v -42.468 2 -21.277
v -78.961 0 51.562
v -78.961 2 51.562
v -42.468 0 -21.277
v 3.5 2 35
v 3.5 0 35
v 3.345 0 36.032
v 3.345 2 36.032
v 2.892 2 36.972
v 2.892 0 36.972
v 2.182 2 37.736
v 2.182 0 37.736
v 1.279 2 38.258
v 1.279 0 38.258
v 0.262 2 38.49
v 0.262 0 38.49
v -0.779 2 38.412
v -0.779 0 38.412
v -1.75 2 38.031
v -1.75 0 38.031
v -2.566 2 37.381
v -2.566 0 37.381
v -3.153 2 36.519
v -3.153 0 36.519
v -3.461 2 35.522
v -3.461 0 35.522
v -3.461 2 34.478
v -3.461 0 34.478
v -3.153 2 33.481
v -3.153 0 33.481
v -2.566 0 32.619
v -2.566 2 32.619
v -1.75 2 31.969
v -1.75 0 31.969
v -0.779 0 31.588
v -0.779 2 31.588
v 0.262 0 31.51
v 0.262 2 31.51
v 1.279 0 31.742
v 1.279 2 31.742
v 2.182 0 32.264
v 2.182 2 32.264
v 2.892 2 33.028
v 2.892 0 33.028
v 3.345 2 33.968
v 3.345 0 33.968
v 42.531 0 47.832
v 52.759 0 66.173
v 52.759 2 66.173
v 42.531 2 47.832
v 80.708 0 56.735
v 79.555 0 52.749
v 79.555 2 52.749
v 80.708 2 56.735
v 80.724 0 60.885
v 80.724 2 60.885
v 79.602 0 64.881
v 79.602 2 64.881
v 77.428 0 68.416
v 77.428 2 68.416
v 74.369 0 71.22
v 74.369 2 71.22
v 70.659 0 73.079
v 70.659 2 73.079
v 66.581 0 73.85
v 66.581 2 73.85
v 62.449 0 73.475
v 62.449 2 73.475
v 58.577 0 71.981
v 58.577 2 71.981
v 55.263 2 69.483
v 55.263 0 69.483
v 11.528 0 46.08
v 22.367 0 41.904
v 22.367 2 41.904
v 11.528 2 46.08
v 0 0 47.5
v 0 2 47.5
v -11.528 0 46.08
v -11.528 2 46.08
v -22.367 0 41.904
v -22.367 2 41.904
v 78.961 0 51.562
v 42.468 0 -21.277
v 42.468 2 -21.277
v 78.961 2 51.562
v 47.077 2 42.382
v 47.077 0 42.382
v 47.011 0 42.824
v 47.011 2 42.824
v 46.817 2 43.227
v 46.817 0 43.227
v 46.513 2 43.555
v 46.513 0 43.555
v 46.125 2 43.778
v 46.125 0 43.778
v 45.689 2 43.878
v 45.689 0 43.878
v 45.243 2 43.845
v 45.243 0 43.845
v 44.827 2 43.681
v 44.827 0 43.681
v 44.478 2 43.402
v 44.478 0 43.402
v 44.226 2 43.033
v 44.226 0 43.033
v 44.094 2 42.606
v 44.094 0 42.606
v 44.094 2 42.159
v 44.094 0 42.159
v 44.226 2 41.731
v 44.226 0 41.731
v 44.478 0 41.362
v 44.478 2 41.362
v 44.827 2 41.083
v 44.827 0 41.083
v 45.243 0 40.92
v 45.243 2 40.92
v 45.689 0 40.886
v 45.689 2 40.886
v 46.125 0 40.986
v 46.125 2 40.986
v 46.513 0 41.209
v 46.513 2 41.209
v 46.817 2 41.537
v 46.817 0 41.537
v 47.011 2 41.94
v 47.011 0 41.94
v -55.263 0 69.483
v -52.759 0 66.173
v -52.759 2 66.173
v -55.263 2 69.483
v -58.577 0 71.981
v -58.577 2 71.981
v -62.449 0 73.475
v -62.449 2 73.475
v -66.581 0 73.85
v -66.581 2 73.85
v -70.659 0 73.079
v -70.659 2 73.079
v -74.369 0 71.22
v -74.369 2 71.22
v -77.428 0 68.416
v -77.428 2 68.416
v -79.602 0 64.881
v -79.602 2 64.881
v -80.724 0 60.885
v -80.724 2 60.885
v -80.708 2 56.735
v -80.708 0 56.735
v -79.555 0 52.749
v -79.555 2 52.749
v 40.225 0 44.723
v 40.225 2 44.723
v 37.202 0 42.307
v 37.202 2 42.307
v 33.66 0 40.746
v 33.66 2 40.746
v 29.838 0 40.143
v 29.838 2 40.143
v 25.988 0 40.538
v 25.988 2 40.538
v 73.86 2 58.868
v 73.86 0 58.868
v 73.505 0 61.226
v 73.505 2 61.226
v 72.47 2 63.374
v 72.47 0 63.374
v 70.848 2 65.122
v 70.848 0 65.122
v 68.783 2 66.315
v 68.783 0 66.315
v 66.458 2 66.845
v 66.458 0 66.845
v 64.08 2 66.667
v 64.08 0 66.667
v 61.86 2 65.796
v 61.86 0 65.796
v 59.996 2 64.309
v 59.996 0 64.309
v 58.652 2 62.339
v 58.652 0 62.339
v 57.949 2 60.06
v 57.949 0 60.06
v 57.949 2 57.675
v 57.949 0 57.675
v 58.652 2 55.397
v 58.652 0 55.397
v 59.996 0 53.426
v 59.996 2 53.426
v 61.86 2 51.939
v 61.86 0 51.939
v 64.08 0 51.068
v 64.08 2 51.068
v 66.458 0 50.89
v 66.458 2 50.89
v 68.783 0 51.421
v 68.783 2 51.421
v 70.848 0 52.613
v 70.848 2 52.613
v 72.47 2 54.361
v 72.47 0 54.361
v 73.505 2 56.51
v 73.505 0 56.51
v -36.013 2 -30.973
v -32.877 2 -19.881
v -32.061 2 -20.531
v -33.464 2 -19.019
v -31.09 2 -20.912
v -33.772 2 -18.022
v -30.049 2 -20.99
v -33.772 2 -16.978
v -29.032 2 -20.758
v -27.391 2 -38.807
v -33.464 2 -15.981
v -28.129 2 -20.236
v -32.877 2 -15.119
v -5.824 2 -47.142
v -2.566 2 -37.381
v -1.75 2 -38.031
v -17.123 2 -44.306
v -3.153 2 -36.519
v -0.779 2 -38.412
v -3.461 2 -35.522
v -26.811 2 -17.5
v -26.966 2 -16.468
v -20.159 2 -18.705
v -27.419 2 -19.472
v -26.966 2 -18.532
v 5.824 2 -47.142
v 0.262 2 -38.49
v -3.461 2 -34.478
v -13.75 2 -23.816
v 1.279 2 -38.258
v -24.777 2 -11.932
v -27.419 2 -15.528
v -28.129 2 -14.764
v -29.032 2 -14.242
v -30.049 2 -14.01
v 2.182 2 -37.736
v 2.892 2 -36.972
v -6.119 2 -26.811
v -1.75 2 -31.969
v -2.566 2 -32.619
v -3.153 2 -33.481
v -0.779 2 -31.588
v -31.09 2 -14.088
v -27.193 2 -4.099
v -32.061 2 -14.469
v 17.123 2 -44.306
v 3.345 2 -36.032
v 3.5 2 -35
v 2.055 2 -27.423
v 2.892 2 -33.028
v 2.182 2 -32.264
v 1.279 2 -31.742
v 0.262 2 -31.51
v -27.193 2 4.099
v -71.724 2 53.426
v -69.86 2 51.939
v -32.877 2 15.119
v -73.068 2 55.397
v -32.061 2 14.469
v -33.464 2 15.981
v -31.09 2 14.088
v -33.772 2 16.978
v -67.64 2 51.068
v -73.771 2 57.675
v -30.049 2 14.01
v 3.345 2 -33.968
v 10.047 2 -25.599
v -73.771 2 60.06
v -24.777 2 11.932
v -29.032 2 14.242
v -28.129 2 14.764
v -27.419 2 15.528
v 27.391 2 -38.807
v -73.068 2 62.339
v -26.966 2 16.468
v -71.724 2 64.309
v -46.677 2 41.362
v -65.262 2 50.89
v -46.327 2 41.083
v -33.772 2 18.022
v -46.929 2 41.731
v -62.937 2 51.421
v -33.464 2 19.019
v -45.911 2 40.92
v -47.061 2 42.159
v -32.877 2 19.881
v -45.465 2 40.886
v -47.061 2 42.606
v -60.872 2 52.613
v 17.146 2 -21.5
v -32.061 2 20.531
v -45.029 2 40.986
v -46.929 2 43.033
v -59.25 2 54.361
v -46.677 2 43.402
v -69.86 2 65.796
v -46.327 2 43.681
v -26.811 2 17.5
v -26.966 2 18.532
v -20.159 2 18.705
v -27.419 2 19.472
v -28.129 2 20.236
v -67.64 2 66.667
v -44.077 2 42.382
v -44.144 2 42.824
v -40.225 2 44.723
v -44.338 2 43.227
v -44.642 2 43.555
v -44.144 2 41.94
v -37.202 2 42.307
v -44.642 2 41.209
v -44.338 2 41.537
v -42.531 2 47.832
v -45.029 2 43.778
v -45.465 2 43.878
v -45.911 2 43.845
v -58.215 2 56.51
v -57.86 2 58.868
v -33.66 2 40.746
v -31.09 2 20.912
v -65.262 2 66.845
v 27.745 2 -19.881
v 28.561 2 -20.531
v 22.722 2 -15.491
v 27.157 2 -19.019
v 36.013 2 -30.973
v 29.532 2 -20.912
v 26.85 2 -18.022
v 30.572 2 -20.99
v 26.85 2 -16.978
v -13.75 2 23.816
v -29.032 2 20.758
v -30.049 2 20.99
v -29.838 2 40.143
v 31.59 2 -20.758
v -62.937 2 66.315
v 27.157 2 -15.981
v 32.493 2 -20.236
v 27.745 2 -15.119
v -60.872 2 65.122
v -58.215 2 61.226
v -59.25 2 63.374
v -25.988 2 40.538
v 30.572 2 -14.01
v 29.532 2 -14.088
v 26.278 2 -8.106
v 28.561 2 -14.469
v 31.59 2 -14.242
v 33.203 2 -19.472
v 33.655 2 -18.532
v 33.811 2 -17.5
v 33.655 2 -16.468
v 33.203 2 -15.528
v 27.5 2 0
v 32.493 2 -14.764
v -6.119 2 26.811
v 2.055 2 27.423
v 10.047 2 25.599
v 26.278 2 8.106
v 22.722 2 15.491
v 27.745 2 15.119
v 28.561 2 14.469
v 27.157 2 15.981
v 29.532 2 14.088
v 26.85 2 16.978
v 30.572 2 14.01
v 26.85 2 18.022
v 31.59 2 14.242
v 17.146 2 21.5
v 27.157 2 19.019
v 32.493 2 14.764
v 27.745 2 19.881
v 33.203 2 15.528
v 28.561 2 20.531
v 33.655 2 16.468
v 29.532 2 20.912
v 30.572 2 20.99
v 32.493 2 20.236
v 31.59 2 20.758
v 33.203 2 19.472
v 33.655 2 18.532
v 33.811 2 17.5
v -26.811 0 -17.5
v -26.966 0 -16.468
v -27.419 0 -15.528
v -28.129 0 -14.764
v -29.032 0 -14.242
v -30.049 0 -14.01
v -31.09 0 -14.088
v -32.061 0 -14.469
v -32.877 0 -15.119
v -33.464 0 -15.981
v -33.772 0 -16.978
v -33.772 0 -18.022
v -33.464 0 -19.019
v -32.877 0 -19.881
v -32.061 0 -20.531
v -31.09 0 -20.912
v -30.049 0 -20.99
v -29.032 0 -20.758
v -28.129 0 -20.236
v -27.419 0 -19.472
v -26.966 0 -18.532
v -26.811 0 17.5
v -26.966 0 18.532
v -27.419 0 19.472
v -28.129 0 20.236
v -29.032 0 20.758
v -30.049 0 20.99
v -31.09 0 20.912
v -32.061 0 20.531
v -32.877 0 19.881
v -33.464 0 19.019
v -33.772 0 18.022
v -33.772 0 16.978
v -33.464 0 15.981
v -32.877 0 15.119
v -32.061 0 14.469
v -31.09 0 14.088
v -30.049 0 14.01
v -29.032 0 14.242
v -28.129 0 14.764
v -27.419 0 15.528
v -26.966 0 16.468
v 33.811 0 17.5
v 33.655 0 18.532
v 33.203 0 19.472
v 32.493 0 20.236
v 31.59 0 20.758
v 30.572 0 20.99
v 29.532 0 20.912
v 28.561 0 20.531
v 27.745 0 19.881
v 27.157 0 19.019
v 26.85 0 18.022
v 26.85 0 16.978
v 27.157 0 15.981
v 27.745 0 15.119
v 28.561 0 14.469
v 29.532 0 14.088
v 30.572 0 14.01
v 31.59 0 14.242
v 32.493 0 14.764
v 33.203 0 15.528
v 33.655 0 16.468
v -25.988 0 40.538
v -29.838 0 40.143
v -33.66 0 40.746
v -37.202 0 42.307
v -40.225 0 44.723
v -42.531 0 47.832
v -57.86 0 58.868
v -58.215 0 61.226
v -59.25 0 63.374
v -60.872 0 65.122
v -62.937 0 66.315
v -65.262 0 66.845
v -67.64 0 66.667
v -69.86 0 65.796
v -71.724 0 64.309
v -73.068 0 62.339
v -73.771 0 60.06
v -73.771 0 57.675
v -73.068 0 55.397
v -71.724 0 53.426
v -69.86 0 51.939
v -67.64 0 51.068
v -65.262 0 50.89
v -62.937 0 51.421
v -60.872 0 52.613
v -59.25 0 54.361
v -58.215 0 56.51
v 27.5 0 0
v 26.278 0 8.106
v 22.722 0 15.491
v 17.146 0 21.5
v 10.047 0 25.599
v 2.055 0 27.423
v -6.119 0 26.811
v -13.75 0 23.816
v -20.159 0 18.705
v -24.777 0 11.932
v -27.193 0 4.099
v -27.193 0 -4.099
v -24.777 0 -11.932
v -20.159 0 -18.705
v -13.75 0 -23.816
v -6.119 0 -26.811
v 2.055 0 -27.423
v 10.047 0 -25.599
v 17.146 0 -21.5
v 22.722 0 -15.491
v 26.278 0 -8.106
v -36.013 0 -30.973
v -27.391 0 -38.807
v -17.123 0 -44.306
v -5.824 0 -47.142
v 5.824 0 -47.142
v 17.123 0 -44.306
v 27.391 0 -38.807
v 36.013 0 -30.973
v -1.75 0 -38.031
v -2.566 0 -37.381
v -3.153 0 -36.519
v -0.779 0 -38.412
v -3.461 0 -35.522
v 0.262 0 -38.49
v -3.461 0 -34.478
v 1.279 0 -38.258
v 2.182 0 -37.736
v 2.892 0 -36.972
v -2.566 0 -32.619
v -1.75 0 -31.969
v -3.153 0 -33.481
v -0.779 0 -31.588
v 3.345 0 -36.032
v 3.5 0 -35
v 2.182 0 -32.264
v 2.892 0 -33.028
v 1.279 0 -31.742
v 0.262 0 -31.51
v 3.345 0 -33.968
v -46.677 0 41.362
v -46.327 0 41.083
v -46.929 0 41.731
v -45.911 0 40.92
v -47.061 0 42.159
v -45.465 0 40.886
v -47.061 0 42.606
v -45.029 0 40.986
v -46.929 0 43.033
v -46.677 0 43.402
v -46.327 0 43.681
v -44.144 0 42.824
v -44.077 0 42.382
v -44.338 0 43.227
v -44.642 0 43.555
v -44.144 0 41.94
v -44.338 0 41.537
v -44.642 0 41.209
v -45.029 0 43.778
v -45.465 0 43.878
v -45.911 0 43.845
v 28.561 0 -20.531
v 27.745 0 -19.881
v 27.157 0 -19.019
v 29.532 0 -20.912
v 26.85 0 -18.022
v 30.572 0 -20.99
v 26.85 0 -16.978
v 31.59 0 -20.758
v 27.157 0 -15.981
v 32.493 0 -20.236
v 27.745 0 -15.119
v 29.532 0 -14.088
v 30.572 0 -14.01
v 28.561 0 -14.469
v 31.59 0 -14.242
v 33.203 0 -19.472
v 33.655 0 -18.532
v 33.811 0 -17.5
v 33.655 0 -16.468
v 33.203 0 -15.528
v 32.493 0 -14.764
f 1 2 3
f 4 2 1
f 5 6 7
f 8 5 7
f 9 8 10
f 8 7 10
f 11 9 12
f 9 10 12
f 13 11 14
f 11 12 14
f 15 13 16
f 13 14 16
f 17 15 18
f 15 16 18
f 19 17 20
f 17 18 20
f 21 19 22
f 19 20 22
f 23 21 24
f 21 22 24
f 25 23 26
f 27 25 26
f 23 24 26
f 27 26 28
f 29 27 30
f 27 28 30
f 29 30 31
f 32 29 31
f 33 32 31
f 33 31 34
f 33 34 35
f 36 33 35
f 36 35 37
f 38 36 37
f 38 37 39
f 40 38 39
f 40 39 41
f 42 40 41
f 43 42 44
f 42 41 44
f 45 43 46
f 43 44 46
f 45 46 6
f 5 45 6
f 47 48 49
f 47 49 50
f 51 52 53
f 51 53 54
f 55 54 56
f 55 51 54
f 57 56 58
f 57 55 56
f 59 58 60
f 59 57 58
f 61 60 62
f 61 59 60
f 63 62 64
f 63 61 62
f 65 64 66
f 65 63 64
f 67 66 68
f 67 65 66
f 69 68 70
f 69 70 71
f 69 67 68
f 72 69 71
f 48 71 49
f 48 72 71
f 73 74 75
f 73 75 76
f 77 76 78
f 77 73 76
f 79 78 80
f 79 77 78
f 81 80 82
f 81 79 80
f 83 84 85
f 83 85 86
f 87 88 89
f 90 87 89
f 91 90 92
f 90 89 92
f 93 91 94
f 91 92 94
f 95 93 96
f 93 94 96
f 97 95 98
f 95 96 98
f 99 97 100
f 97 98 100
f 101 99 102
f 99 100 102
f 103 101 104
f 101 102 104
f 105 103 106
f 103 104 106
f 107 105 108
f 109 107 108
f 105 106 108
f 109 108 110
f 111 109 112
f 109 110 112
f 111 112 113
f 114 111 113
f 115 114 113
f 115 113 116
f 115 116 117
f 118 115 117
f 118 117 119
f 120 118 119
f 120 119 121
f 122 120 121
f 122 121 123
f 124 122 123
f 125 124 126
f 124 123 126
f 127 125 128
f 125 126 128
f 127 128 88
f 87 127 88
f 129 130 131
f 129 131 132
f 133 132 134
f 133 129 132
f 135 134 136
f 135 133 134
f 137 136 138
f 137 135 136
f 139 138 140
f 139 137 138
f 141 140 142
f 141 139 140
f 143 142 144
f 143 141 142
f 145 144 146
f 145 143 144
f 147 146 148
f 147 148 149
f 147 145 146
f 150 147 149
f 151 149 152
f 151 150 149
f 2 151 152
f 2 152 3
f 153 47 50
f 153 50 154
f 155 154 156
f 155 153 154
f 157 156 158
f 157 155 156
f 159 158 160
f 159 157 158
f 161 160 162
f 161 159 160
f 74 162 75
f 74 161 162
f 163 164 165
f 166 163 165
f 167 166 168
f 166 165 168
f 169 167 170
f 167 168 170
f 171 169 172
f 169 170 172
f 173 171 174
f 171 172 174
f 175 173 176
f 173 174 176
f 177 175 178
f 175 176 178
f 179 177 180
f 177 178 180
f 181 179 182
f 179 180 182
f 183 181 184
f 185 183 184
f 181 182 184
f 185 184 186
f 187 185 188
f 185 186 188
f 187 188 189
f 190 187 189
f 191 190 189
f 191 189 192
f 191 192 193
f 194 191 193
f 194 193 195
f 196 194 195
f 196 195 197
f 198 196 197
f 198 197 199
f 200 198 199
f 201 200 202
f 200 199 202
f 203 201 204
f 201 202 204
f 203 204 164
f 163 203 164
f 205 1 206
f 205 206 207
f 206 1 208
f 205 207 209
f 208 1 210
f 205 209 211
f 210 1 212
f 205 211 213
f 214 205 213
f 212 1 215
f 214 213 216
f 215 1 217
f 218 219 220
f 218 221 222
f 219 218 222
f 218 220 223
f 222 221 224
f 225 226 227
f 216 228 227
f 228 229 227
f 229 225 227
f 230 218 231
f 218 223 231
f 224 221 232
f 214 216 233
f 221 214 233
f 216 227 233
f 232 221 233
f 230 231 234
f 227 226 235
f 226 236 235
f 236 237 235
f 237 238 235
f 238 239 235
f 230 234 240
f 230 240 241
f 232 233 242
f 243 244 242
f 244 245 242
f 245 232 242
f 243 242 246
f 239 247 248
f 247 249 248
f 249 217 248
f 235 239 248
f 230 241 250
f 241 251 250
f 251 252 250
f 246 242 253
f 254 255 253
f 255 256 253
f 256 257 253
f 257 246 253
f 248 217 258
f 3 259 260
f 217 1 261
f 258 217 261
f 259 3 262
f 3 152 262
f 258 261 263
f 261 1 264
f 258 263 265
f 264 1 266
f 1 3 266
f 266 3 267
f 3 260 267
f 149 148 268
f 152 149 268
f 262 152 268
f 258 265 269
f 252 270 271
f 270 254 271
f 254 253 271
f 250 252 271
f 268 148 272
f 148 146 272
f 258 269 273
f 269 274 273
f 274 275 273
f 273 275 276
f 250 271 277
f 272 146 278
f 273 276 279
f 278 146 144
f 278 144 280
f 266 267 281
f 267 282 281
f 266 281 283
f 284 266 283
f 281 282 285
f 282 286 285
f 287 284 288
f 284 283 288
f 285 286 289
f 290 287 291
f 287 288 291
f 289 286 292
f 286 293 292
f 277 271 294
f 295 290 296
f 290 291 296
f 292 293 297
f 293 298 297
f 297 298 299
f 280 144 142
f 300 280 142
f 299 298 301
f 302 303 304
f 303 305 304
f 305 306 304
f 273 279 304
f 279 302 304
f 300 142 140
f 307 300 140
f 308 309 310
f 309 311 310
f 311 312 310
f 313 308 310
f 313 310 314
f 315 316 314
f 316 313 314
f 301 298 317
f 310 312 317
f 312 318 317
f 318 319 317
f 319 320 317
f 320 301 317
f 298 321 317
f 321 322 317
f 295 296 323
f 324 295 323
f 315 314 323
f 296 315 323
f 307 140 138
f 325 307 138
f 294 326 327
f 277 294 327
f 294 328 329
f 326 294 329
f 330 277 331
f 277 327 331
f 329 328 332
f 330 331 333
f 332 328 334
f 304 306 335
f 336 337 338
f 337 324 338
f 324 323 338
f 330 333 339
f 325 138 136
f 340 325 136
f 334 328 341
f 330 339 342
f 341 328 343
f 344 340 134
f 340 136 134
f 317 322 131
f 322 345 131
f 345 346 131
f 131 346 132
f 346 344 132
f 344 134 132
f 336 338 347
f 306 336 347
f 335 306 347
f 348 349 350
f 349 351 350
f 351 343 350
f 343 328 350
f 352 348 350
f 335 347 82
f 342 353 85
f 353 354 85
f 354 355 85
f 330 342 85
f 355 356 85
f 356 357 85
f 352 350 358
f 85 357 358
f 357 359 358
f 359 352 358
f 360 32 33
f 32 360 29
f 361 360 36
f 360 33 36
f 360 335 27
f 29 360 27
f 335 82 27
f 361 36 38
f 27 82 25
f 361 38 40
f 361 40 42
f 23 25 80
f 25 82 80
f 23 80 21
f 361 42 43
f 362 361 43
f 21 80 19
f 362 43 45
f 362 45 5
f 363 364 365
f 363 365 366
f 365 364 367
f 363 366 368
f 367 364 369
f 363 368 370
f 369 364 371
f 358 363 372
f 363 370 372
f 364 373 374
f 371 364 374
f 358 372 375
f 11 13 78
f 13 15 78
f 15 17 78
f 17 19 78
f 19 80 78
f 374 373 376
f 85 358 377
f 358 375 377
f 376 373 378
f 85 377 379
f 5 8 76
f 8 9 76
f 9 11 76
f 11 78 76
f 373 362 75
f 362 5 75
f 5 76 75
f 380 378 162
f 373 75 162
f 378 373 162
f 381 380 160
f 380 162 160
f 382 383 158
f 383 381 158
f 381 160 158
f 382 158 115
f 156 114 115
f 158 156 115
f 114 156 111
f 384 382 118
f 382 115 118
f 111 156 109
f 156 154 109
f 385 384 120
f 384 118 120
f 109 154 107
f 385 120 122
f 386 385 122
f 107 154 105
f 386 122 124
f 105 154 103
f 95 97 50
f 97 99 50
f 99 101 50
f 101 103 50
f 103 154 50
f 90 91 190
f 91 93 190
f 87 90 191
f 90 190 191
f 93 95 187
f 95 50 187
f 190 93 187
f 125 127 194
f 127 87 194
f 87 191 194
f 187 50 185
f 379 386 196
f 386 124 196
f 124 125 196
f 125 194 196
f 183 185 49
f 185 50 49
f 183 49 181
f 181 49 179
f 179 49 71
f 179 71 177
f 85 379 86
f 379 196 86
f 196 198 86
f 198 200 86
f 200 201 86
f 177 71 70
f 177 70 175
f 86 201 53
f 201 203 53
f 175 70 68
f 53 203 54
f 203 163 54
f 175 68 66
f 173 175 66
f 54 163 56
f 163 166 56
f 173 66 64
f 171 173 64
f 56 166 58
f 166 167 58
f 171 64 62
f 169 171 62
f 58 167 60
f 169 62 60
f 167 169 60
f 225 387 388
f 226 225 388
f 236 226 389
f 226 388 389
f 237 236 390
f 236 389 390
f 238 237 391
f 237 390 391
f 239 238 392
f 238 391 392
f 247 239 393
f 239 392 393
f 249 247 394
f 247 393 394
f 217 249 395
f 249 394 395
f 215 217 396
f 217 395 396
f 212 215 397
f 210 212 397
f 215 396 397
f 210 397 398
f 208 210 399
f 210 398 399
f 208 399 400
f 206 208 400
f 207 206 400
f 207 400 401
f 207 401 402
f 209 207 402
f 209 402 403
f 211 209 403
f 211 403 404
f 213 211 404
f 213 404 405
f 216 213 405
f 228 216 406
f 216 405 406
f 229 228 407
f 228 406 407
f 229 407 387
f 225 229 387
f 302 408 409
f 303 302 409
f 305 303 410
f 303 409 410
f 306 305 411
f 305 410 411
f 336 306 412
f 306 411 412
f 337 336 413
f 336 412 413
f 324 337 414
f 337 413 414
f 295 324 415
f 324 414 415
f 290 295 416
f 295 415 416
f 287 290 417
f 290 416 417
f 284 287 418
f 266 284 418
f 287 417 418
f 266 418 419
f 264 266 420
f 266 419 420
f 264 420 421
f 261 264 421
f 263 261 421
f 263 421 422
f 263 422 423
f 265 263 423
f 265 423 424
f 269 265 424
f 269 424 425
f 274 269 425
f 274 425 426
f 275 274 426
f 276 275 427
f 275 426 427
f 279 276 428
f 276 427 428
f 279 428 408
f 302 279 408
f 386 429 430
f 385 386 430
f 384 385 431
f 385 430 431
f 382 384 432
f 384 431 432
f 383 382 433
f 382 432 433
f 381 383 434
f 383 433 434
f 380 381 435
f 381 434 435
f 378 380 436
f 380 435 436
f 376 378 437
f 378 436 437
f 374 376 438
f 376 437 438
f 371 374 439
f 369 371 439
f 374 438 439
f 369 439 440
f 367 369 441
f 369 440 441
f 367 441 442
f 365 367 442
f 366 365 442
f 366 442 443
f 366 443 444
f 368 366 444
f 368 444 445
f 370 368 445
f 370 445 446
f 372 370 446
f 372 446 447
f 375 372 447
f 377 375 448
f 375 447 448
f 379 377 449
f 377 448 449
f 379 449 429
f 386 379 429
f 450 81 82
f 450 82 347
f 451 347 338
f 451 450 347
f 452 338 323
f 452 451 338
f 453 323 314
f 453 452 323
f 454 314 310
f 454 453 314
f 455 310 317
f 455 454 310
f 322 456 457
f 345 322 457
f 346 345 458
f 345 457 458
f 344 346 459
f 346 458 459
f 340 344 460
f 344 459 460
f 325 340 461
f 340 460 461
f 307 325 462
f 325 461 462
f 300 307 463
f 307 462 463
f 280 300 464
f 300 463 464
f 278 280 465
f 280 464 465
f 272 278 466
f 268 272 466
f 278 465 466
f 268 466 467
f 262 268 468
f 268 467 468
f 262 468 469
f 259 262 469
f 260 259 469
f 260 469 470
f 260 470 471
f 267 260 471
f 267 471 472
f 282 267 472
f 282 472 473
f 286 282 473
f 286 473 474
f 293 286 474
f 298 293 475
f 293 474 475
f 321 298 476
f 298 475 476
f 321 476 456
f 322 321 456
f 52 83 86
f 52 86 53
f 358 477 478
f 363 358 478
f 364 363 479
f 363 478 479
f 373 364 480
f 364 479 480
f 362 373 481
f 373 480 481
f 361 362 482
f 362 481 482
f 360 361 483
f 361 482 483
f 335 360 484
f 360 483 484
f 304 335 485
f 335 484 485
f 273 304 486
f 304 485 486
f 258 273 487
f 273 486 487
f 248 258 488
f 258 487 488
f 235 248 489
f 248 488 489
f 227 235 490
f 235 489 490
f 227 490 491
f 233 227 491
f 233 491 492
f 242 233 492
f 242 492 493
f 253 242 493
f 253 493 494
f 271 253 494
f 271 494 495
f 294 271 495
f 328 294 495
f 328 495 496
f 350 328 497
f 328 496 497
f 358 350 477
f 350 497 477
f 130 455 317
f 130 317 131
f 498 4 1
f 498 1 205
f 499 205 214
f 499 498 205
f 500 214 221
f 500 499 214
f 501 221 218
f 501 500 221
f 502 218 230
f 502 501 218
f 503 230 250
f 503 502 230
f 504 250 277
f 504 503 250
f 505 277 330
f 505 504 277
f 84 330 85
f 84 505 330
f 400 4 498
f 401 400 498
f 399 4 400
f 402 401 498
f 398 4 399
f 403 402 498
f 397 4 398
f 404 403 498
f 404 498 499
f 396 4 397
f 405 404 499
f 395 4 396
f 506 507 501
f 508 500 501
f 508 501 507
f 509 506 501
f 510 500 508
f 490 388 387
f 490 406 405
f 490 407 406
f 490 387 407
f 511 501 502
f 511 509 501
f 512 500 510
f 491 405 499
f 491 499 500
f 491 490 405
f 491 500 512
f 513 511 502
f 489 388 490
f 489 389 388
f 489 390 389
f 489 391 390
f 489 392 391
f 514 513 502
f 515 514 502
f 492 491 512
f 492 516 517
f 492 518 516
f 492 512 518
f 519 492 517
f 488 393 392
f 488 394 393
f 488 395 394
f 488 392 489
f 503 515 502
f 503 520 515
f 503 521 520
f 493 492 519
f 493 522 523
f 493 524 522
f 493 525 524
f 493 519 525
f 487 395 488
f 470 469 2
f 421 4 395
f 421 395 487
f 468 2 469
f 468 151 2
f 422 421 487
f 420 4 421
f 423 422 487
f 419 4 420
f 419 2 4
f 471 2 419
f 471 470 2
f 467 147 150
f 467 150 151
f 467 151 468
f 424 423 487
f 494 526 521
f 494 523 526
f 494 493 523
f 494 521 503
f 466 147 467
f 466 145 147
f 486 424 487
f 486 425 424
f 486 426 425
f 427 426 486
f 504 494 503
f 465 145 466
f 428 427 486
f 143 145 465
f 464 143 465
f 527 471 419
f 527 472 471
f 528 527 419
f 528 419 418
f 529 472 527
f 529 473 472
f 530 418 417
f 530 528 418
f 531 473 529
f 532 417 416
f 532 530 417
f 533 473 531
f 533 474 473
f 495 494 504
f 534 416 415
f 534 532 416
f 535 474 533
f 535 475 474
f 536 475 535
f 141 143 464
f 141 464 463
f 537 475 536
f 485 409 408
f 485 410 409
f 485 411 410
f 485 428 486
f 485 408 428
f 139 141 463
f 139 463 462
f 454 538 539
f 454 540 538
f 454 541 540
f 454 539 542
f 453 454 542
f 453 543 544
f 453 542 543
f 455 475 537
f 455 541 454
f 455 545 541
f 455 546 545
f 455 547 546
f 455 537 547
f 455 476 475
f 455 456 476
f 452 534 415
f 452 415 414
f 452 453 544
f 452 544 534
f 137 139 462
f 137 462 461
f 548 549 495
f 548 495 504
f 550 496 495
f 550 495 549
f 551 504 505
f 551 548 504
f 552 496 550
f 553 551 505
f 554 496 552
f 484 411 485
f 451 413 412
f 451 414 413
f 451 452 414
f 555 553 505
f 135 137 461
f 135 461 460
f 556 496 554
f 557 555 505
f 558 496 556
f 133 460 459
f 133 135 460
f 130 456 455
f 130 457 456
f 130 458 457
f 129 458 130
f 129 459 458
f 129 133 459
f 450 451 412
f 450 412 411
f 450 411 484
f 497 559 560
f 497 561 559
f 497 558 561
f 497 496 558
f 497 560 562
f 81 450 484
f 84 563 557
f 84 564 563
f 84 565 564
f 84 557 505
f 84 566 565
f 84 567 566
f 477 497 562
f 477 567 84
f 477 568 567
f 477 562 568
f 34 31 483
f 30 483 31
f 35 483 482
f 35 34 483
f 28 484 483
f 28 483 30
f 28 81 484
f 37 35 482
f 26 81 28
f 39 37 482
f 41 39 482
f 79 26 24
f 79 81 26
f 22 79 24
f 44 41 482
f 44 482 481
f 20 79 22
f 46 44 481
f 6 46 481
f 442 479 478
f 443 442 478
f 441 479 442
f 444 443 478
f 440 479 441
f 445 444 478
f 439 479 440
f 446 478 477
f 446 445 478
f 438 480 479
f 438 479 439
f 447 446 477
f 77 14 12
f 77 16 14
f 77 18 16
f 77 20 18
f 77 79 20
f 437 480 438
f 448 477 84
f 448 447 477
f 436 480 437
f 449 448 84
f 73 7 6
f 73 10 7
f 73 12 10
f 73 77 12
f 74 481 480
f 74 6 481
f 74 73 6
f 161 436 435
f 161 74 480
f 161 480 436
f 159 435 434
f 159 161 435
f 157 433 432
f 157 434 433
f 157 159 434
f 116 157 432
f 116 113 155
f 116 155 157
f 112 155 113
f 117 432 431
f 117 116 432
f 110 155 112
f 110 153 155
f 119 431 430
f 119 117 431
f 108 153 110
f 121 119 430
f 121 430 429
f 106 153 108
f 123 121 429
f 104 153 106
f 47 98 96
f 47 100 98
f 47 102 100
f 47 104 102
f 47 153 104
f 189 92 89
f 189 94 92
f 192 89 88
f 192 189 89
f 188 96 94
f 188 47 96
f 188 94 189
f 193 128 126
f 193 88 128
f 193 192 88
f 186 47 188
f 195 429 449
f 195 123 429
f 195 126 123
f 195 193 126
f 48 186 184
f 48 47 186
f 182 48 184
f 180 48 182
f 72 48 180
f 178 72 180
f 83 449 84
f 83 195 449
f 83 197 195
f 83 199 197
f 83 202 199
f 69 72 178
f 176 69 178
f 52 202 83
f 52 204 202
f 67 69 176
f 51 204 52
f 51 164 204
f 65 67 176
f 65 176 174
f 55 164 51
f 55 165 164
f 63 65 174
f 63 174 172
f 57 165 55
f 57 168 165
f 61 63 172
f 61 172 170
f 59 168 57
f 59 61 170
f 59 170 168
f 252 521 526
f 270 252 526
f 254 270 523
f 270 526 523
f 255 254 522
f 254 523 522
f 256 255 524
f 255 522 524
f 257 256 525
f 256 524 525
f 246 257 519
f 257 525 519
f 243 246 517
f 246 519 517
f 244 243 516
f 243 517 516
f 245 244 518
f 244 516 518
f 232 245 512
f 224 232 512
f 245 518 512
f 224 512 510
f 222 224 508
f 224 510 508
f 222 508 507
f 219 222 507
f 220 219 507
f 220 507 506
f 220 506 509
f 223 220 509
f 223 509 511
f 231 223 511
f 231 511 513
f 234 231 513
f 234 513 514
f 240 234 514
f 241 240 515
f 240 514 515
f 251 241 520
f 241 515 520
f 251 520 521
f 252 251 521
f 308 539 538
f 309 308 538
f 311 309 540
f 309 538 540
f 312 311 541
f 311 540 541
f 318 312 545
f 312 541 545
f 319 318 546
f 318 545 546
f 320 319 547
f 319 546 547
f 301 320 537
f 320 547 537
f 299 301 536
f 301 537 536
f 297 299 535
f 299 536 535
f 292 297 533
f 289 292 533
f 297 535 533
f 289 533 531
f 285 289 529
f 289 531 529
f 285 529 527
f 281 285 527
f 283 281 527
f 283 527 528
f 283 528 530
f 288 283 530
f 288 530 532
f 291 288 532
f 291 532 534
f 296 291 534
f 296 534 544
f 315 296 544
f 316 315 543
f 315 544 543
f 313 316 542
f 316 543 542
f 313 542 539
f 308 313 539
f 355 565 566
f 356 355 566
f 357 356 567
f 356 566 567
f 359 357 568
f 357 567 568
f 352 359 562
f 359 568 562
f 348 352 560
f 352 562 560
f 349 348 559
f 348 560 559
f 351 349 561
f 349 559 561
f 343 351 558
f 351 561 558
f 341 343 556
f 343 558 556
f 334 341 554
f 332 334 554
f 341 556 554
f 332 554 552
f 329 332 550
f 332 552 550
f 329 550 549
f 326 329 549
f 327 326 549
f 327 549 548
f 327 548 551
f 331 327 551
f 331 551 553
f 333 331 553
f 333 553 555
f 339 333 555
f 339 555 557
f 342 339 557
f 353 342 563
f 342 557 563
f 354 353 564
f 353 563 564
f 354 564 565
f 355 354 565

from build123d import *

# Parameters (mm, degrees)
F2_R     = 3.5
F2_R_2   = 27.5
F2_R_3   = 1.5
F2_R_4   = 8
F3_DEPTH = 2


with BuildPart() as f3:
    # F2 (on Front) → F3 (new body)
    with BuildSketch(Plane.XZ):
        with BuildLine():
            Line((-42.53072, 47.831513), (-52.759336, 66.173364))
            ThreePointArc((-52.759336, 66.173364), (-72.578902, 72.278632), (-79.555119, 52.748606))
            Line((-79.555119, 52.748606), (-78.960552, 51.561851))
            Line((-78.960552, 51.561851), (-42.468246, -21.276702))
            ThreePointArc((-42.468246, -21.276702), (0, -47.5), (42.468246, -21.276702))
            Line((42.468246, -21.276702), (78.960552, 51.561851))
            Line((78.960552, 51.561851), (79.555119, 52.748606))
            ThreePointArc((79.555119, 52.748606), (72.578902, 72.278632), (52.759336, 66.173364))
            Line((52.759336, 66.173364), (42.53072, 47.831513))
            ThreePointArc((42.53072, 47.831513), (33.660405, 40.74614), (22.366885, 41.904325))
            ThreePointArc((22.366885, 41.904325), (0, 47.5), (-22.366885, 41.904325))
            ThreePointArc((-22.366885, 41.904325), (-33.660405, 40.74614), (-42.53072, 47.831513))
        make_face()
        with Locations((-30.310889, -17.5)):
            Circle(F2_R, mode=Mode.SUBTRACT)
        with Locations((0, -35)):
            Circle(F2_R, mode=Mode.SUBTRACT)
        with Locations((30.310889, -17.5)):
            Circle(F2_R, mode=Mode.SUBTRACT)
        Circle(F2_R_2, mode=Mode.SUBTRACT)
        with Locations((-45.577269, 42.382158)):
            Circle(F2_R_3, mode=Mode.SUBTRACT)
        with Locations((-30.310889, 17.5)):
            Circle(F2_R, mode=Mode.SUBTRACT)
        with Locations((-65.859944, 58.867607)):
            Circle(F2_R_4, mode=Mode.SUBTRACT)
        with Locations((30.310889, 17.5)):
            Circle(F2_R, mode=Mode.SUBTRACT)
        with Locations((0, 35)):
            Circle(F2_R, mode=Mode.SUBTRACT)
        with Locations((45.577269, 42.382158)):
            Circle(F2_R_3, mode=Mode.SUBTRACT)
        with Locations((65.859944, 58.867607)):
            Circle(F2_R_4, mode=Mode.SUBTRACT)
    extrude(amount=-F3_DEPTH)


solid = f3.part
